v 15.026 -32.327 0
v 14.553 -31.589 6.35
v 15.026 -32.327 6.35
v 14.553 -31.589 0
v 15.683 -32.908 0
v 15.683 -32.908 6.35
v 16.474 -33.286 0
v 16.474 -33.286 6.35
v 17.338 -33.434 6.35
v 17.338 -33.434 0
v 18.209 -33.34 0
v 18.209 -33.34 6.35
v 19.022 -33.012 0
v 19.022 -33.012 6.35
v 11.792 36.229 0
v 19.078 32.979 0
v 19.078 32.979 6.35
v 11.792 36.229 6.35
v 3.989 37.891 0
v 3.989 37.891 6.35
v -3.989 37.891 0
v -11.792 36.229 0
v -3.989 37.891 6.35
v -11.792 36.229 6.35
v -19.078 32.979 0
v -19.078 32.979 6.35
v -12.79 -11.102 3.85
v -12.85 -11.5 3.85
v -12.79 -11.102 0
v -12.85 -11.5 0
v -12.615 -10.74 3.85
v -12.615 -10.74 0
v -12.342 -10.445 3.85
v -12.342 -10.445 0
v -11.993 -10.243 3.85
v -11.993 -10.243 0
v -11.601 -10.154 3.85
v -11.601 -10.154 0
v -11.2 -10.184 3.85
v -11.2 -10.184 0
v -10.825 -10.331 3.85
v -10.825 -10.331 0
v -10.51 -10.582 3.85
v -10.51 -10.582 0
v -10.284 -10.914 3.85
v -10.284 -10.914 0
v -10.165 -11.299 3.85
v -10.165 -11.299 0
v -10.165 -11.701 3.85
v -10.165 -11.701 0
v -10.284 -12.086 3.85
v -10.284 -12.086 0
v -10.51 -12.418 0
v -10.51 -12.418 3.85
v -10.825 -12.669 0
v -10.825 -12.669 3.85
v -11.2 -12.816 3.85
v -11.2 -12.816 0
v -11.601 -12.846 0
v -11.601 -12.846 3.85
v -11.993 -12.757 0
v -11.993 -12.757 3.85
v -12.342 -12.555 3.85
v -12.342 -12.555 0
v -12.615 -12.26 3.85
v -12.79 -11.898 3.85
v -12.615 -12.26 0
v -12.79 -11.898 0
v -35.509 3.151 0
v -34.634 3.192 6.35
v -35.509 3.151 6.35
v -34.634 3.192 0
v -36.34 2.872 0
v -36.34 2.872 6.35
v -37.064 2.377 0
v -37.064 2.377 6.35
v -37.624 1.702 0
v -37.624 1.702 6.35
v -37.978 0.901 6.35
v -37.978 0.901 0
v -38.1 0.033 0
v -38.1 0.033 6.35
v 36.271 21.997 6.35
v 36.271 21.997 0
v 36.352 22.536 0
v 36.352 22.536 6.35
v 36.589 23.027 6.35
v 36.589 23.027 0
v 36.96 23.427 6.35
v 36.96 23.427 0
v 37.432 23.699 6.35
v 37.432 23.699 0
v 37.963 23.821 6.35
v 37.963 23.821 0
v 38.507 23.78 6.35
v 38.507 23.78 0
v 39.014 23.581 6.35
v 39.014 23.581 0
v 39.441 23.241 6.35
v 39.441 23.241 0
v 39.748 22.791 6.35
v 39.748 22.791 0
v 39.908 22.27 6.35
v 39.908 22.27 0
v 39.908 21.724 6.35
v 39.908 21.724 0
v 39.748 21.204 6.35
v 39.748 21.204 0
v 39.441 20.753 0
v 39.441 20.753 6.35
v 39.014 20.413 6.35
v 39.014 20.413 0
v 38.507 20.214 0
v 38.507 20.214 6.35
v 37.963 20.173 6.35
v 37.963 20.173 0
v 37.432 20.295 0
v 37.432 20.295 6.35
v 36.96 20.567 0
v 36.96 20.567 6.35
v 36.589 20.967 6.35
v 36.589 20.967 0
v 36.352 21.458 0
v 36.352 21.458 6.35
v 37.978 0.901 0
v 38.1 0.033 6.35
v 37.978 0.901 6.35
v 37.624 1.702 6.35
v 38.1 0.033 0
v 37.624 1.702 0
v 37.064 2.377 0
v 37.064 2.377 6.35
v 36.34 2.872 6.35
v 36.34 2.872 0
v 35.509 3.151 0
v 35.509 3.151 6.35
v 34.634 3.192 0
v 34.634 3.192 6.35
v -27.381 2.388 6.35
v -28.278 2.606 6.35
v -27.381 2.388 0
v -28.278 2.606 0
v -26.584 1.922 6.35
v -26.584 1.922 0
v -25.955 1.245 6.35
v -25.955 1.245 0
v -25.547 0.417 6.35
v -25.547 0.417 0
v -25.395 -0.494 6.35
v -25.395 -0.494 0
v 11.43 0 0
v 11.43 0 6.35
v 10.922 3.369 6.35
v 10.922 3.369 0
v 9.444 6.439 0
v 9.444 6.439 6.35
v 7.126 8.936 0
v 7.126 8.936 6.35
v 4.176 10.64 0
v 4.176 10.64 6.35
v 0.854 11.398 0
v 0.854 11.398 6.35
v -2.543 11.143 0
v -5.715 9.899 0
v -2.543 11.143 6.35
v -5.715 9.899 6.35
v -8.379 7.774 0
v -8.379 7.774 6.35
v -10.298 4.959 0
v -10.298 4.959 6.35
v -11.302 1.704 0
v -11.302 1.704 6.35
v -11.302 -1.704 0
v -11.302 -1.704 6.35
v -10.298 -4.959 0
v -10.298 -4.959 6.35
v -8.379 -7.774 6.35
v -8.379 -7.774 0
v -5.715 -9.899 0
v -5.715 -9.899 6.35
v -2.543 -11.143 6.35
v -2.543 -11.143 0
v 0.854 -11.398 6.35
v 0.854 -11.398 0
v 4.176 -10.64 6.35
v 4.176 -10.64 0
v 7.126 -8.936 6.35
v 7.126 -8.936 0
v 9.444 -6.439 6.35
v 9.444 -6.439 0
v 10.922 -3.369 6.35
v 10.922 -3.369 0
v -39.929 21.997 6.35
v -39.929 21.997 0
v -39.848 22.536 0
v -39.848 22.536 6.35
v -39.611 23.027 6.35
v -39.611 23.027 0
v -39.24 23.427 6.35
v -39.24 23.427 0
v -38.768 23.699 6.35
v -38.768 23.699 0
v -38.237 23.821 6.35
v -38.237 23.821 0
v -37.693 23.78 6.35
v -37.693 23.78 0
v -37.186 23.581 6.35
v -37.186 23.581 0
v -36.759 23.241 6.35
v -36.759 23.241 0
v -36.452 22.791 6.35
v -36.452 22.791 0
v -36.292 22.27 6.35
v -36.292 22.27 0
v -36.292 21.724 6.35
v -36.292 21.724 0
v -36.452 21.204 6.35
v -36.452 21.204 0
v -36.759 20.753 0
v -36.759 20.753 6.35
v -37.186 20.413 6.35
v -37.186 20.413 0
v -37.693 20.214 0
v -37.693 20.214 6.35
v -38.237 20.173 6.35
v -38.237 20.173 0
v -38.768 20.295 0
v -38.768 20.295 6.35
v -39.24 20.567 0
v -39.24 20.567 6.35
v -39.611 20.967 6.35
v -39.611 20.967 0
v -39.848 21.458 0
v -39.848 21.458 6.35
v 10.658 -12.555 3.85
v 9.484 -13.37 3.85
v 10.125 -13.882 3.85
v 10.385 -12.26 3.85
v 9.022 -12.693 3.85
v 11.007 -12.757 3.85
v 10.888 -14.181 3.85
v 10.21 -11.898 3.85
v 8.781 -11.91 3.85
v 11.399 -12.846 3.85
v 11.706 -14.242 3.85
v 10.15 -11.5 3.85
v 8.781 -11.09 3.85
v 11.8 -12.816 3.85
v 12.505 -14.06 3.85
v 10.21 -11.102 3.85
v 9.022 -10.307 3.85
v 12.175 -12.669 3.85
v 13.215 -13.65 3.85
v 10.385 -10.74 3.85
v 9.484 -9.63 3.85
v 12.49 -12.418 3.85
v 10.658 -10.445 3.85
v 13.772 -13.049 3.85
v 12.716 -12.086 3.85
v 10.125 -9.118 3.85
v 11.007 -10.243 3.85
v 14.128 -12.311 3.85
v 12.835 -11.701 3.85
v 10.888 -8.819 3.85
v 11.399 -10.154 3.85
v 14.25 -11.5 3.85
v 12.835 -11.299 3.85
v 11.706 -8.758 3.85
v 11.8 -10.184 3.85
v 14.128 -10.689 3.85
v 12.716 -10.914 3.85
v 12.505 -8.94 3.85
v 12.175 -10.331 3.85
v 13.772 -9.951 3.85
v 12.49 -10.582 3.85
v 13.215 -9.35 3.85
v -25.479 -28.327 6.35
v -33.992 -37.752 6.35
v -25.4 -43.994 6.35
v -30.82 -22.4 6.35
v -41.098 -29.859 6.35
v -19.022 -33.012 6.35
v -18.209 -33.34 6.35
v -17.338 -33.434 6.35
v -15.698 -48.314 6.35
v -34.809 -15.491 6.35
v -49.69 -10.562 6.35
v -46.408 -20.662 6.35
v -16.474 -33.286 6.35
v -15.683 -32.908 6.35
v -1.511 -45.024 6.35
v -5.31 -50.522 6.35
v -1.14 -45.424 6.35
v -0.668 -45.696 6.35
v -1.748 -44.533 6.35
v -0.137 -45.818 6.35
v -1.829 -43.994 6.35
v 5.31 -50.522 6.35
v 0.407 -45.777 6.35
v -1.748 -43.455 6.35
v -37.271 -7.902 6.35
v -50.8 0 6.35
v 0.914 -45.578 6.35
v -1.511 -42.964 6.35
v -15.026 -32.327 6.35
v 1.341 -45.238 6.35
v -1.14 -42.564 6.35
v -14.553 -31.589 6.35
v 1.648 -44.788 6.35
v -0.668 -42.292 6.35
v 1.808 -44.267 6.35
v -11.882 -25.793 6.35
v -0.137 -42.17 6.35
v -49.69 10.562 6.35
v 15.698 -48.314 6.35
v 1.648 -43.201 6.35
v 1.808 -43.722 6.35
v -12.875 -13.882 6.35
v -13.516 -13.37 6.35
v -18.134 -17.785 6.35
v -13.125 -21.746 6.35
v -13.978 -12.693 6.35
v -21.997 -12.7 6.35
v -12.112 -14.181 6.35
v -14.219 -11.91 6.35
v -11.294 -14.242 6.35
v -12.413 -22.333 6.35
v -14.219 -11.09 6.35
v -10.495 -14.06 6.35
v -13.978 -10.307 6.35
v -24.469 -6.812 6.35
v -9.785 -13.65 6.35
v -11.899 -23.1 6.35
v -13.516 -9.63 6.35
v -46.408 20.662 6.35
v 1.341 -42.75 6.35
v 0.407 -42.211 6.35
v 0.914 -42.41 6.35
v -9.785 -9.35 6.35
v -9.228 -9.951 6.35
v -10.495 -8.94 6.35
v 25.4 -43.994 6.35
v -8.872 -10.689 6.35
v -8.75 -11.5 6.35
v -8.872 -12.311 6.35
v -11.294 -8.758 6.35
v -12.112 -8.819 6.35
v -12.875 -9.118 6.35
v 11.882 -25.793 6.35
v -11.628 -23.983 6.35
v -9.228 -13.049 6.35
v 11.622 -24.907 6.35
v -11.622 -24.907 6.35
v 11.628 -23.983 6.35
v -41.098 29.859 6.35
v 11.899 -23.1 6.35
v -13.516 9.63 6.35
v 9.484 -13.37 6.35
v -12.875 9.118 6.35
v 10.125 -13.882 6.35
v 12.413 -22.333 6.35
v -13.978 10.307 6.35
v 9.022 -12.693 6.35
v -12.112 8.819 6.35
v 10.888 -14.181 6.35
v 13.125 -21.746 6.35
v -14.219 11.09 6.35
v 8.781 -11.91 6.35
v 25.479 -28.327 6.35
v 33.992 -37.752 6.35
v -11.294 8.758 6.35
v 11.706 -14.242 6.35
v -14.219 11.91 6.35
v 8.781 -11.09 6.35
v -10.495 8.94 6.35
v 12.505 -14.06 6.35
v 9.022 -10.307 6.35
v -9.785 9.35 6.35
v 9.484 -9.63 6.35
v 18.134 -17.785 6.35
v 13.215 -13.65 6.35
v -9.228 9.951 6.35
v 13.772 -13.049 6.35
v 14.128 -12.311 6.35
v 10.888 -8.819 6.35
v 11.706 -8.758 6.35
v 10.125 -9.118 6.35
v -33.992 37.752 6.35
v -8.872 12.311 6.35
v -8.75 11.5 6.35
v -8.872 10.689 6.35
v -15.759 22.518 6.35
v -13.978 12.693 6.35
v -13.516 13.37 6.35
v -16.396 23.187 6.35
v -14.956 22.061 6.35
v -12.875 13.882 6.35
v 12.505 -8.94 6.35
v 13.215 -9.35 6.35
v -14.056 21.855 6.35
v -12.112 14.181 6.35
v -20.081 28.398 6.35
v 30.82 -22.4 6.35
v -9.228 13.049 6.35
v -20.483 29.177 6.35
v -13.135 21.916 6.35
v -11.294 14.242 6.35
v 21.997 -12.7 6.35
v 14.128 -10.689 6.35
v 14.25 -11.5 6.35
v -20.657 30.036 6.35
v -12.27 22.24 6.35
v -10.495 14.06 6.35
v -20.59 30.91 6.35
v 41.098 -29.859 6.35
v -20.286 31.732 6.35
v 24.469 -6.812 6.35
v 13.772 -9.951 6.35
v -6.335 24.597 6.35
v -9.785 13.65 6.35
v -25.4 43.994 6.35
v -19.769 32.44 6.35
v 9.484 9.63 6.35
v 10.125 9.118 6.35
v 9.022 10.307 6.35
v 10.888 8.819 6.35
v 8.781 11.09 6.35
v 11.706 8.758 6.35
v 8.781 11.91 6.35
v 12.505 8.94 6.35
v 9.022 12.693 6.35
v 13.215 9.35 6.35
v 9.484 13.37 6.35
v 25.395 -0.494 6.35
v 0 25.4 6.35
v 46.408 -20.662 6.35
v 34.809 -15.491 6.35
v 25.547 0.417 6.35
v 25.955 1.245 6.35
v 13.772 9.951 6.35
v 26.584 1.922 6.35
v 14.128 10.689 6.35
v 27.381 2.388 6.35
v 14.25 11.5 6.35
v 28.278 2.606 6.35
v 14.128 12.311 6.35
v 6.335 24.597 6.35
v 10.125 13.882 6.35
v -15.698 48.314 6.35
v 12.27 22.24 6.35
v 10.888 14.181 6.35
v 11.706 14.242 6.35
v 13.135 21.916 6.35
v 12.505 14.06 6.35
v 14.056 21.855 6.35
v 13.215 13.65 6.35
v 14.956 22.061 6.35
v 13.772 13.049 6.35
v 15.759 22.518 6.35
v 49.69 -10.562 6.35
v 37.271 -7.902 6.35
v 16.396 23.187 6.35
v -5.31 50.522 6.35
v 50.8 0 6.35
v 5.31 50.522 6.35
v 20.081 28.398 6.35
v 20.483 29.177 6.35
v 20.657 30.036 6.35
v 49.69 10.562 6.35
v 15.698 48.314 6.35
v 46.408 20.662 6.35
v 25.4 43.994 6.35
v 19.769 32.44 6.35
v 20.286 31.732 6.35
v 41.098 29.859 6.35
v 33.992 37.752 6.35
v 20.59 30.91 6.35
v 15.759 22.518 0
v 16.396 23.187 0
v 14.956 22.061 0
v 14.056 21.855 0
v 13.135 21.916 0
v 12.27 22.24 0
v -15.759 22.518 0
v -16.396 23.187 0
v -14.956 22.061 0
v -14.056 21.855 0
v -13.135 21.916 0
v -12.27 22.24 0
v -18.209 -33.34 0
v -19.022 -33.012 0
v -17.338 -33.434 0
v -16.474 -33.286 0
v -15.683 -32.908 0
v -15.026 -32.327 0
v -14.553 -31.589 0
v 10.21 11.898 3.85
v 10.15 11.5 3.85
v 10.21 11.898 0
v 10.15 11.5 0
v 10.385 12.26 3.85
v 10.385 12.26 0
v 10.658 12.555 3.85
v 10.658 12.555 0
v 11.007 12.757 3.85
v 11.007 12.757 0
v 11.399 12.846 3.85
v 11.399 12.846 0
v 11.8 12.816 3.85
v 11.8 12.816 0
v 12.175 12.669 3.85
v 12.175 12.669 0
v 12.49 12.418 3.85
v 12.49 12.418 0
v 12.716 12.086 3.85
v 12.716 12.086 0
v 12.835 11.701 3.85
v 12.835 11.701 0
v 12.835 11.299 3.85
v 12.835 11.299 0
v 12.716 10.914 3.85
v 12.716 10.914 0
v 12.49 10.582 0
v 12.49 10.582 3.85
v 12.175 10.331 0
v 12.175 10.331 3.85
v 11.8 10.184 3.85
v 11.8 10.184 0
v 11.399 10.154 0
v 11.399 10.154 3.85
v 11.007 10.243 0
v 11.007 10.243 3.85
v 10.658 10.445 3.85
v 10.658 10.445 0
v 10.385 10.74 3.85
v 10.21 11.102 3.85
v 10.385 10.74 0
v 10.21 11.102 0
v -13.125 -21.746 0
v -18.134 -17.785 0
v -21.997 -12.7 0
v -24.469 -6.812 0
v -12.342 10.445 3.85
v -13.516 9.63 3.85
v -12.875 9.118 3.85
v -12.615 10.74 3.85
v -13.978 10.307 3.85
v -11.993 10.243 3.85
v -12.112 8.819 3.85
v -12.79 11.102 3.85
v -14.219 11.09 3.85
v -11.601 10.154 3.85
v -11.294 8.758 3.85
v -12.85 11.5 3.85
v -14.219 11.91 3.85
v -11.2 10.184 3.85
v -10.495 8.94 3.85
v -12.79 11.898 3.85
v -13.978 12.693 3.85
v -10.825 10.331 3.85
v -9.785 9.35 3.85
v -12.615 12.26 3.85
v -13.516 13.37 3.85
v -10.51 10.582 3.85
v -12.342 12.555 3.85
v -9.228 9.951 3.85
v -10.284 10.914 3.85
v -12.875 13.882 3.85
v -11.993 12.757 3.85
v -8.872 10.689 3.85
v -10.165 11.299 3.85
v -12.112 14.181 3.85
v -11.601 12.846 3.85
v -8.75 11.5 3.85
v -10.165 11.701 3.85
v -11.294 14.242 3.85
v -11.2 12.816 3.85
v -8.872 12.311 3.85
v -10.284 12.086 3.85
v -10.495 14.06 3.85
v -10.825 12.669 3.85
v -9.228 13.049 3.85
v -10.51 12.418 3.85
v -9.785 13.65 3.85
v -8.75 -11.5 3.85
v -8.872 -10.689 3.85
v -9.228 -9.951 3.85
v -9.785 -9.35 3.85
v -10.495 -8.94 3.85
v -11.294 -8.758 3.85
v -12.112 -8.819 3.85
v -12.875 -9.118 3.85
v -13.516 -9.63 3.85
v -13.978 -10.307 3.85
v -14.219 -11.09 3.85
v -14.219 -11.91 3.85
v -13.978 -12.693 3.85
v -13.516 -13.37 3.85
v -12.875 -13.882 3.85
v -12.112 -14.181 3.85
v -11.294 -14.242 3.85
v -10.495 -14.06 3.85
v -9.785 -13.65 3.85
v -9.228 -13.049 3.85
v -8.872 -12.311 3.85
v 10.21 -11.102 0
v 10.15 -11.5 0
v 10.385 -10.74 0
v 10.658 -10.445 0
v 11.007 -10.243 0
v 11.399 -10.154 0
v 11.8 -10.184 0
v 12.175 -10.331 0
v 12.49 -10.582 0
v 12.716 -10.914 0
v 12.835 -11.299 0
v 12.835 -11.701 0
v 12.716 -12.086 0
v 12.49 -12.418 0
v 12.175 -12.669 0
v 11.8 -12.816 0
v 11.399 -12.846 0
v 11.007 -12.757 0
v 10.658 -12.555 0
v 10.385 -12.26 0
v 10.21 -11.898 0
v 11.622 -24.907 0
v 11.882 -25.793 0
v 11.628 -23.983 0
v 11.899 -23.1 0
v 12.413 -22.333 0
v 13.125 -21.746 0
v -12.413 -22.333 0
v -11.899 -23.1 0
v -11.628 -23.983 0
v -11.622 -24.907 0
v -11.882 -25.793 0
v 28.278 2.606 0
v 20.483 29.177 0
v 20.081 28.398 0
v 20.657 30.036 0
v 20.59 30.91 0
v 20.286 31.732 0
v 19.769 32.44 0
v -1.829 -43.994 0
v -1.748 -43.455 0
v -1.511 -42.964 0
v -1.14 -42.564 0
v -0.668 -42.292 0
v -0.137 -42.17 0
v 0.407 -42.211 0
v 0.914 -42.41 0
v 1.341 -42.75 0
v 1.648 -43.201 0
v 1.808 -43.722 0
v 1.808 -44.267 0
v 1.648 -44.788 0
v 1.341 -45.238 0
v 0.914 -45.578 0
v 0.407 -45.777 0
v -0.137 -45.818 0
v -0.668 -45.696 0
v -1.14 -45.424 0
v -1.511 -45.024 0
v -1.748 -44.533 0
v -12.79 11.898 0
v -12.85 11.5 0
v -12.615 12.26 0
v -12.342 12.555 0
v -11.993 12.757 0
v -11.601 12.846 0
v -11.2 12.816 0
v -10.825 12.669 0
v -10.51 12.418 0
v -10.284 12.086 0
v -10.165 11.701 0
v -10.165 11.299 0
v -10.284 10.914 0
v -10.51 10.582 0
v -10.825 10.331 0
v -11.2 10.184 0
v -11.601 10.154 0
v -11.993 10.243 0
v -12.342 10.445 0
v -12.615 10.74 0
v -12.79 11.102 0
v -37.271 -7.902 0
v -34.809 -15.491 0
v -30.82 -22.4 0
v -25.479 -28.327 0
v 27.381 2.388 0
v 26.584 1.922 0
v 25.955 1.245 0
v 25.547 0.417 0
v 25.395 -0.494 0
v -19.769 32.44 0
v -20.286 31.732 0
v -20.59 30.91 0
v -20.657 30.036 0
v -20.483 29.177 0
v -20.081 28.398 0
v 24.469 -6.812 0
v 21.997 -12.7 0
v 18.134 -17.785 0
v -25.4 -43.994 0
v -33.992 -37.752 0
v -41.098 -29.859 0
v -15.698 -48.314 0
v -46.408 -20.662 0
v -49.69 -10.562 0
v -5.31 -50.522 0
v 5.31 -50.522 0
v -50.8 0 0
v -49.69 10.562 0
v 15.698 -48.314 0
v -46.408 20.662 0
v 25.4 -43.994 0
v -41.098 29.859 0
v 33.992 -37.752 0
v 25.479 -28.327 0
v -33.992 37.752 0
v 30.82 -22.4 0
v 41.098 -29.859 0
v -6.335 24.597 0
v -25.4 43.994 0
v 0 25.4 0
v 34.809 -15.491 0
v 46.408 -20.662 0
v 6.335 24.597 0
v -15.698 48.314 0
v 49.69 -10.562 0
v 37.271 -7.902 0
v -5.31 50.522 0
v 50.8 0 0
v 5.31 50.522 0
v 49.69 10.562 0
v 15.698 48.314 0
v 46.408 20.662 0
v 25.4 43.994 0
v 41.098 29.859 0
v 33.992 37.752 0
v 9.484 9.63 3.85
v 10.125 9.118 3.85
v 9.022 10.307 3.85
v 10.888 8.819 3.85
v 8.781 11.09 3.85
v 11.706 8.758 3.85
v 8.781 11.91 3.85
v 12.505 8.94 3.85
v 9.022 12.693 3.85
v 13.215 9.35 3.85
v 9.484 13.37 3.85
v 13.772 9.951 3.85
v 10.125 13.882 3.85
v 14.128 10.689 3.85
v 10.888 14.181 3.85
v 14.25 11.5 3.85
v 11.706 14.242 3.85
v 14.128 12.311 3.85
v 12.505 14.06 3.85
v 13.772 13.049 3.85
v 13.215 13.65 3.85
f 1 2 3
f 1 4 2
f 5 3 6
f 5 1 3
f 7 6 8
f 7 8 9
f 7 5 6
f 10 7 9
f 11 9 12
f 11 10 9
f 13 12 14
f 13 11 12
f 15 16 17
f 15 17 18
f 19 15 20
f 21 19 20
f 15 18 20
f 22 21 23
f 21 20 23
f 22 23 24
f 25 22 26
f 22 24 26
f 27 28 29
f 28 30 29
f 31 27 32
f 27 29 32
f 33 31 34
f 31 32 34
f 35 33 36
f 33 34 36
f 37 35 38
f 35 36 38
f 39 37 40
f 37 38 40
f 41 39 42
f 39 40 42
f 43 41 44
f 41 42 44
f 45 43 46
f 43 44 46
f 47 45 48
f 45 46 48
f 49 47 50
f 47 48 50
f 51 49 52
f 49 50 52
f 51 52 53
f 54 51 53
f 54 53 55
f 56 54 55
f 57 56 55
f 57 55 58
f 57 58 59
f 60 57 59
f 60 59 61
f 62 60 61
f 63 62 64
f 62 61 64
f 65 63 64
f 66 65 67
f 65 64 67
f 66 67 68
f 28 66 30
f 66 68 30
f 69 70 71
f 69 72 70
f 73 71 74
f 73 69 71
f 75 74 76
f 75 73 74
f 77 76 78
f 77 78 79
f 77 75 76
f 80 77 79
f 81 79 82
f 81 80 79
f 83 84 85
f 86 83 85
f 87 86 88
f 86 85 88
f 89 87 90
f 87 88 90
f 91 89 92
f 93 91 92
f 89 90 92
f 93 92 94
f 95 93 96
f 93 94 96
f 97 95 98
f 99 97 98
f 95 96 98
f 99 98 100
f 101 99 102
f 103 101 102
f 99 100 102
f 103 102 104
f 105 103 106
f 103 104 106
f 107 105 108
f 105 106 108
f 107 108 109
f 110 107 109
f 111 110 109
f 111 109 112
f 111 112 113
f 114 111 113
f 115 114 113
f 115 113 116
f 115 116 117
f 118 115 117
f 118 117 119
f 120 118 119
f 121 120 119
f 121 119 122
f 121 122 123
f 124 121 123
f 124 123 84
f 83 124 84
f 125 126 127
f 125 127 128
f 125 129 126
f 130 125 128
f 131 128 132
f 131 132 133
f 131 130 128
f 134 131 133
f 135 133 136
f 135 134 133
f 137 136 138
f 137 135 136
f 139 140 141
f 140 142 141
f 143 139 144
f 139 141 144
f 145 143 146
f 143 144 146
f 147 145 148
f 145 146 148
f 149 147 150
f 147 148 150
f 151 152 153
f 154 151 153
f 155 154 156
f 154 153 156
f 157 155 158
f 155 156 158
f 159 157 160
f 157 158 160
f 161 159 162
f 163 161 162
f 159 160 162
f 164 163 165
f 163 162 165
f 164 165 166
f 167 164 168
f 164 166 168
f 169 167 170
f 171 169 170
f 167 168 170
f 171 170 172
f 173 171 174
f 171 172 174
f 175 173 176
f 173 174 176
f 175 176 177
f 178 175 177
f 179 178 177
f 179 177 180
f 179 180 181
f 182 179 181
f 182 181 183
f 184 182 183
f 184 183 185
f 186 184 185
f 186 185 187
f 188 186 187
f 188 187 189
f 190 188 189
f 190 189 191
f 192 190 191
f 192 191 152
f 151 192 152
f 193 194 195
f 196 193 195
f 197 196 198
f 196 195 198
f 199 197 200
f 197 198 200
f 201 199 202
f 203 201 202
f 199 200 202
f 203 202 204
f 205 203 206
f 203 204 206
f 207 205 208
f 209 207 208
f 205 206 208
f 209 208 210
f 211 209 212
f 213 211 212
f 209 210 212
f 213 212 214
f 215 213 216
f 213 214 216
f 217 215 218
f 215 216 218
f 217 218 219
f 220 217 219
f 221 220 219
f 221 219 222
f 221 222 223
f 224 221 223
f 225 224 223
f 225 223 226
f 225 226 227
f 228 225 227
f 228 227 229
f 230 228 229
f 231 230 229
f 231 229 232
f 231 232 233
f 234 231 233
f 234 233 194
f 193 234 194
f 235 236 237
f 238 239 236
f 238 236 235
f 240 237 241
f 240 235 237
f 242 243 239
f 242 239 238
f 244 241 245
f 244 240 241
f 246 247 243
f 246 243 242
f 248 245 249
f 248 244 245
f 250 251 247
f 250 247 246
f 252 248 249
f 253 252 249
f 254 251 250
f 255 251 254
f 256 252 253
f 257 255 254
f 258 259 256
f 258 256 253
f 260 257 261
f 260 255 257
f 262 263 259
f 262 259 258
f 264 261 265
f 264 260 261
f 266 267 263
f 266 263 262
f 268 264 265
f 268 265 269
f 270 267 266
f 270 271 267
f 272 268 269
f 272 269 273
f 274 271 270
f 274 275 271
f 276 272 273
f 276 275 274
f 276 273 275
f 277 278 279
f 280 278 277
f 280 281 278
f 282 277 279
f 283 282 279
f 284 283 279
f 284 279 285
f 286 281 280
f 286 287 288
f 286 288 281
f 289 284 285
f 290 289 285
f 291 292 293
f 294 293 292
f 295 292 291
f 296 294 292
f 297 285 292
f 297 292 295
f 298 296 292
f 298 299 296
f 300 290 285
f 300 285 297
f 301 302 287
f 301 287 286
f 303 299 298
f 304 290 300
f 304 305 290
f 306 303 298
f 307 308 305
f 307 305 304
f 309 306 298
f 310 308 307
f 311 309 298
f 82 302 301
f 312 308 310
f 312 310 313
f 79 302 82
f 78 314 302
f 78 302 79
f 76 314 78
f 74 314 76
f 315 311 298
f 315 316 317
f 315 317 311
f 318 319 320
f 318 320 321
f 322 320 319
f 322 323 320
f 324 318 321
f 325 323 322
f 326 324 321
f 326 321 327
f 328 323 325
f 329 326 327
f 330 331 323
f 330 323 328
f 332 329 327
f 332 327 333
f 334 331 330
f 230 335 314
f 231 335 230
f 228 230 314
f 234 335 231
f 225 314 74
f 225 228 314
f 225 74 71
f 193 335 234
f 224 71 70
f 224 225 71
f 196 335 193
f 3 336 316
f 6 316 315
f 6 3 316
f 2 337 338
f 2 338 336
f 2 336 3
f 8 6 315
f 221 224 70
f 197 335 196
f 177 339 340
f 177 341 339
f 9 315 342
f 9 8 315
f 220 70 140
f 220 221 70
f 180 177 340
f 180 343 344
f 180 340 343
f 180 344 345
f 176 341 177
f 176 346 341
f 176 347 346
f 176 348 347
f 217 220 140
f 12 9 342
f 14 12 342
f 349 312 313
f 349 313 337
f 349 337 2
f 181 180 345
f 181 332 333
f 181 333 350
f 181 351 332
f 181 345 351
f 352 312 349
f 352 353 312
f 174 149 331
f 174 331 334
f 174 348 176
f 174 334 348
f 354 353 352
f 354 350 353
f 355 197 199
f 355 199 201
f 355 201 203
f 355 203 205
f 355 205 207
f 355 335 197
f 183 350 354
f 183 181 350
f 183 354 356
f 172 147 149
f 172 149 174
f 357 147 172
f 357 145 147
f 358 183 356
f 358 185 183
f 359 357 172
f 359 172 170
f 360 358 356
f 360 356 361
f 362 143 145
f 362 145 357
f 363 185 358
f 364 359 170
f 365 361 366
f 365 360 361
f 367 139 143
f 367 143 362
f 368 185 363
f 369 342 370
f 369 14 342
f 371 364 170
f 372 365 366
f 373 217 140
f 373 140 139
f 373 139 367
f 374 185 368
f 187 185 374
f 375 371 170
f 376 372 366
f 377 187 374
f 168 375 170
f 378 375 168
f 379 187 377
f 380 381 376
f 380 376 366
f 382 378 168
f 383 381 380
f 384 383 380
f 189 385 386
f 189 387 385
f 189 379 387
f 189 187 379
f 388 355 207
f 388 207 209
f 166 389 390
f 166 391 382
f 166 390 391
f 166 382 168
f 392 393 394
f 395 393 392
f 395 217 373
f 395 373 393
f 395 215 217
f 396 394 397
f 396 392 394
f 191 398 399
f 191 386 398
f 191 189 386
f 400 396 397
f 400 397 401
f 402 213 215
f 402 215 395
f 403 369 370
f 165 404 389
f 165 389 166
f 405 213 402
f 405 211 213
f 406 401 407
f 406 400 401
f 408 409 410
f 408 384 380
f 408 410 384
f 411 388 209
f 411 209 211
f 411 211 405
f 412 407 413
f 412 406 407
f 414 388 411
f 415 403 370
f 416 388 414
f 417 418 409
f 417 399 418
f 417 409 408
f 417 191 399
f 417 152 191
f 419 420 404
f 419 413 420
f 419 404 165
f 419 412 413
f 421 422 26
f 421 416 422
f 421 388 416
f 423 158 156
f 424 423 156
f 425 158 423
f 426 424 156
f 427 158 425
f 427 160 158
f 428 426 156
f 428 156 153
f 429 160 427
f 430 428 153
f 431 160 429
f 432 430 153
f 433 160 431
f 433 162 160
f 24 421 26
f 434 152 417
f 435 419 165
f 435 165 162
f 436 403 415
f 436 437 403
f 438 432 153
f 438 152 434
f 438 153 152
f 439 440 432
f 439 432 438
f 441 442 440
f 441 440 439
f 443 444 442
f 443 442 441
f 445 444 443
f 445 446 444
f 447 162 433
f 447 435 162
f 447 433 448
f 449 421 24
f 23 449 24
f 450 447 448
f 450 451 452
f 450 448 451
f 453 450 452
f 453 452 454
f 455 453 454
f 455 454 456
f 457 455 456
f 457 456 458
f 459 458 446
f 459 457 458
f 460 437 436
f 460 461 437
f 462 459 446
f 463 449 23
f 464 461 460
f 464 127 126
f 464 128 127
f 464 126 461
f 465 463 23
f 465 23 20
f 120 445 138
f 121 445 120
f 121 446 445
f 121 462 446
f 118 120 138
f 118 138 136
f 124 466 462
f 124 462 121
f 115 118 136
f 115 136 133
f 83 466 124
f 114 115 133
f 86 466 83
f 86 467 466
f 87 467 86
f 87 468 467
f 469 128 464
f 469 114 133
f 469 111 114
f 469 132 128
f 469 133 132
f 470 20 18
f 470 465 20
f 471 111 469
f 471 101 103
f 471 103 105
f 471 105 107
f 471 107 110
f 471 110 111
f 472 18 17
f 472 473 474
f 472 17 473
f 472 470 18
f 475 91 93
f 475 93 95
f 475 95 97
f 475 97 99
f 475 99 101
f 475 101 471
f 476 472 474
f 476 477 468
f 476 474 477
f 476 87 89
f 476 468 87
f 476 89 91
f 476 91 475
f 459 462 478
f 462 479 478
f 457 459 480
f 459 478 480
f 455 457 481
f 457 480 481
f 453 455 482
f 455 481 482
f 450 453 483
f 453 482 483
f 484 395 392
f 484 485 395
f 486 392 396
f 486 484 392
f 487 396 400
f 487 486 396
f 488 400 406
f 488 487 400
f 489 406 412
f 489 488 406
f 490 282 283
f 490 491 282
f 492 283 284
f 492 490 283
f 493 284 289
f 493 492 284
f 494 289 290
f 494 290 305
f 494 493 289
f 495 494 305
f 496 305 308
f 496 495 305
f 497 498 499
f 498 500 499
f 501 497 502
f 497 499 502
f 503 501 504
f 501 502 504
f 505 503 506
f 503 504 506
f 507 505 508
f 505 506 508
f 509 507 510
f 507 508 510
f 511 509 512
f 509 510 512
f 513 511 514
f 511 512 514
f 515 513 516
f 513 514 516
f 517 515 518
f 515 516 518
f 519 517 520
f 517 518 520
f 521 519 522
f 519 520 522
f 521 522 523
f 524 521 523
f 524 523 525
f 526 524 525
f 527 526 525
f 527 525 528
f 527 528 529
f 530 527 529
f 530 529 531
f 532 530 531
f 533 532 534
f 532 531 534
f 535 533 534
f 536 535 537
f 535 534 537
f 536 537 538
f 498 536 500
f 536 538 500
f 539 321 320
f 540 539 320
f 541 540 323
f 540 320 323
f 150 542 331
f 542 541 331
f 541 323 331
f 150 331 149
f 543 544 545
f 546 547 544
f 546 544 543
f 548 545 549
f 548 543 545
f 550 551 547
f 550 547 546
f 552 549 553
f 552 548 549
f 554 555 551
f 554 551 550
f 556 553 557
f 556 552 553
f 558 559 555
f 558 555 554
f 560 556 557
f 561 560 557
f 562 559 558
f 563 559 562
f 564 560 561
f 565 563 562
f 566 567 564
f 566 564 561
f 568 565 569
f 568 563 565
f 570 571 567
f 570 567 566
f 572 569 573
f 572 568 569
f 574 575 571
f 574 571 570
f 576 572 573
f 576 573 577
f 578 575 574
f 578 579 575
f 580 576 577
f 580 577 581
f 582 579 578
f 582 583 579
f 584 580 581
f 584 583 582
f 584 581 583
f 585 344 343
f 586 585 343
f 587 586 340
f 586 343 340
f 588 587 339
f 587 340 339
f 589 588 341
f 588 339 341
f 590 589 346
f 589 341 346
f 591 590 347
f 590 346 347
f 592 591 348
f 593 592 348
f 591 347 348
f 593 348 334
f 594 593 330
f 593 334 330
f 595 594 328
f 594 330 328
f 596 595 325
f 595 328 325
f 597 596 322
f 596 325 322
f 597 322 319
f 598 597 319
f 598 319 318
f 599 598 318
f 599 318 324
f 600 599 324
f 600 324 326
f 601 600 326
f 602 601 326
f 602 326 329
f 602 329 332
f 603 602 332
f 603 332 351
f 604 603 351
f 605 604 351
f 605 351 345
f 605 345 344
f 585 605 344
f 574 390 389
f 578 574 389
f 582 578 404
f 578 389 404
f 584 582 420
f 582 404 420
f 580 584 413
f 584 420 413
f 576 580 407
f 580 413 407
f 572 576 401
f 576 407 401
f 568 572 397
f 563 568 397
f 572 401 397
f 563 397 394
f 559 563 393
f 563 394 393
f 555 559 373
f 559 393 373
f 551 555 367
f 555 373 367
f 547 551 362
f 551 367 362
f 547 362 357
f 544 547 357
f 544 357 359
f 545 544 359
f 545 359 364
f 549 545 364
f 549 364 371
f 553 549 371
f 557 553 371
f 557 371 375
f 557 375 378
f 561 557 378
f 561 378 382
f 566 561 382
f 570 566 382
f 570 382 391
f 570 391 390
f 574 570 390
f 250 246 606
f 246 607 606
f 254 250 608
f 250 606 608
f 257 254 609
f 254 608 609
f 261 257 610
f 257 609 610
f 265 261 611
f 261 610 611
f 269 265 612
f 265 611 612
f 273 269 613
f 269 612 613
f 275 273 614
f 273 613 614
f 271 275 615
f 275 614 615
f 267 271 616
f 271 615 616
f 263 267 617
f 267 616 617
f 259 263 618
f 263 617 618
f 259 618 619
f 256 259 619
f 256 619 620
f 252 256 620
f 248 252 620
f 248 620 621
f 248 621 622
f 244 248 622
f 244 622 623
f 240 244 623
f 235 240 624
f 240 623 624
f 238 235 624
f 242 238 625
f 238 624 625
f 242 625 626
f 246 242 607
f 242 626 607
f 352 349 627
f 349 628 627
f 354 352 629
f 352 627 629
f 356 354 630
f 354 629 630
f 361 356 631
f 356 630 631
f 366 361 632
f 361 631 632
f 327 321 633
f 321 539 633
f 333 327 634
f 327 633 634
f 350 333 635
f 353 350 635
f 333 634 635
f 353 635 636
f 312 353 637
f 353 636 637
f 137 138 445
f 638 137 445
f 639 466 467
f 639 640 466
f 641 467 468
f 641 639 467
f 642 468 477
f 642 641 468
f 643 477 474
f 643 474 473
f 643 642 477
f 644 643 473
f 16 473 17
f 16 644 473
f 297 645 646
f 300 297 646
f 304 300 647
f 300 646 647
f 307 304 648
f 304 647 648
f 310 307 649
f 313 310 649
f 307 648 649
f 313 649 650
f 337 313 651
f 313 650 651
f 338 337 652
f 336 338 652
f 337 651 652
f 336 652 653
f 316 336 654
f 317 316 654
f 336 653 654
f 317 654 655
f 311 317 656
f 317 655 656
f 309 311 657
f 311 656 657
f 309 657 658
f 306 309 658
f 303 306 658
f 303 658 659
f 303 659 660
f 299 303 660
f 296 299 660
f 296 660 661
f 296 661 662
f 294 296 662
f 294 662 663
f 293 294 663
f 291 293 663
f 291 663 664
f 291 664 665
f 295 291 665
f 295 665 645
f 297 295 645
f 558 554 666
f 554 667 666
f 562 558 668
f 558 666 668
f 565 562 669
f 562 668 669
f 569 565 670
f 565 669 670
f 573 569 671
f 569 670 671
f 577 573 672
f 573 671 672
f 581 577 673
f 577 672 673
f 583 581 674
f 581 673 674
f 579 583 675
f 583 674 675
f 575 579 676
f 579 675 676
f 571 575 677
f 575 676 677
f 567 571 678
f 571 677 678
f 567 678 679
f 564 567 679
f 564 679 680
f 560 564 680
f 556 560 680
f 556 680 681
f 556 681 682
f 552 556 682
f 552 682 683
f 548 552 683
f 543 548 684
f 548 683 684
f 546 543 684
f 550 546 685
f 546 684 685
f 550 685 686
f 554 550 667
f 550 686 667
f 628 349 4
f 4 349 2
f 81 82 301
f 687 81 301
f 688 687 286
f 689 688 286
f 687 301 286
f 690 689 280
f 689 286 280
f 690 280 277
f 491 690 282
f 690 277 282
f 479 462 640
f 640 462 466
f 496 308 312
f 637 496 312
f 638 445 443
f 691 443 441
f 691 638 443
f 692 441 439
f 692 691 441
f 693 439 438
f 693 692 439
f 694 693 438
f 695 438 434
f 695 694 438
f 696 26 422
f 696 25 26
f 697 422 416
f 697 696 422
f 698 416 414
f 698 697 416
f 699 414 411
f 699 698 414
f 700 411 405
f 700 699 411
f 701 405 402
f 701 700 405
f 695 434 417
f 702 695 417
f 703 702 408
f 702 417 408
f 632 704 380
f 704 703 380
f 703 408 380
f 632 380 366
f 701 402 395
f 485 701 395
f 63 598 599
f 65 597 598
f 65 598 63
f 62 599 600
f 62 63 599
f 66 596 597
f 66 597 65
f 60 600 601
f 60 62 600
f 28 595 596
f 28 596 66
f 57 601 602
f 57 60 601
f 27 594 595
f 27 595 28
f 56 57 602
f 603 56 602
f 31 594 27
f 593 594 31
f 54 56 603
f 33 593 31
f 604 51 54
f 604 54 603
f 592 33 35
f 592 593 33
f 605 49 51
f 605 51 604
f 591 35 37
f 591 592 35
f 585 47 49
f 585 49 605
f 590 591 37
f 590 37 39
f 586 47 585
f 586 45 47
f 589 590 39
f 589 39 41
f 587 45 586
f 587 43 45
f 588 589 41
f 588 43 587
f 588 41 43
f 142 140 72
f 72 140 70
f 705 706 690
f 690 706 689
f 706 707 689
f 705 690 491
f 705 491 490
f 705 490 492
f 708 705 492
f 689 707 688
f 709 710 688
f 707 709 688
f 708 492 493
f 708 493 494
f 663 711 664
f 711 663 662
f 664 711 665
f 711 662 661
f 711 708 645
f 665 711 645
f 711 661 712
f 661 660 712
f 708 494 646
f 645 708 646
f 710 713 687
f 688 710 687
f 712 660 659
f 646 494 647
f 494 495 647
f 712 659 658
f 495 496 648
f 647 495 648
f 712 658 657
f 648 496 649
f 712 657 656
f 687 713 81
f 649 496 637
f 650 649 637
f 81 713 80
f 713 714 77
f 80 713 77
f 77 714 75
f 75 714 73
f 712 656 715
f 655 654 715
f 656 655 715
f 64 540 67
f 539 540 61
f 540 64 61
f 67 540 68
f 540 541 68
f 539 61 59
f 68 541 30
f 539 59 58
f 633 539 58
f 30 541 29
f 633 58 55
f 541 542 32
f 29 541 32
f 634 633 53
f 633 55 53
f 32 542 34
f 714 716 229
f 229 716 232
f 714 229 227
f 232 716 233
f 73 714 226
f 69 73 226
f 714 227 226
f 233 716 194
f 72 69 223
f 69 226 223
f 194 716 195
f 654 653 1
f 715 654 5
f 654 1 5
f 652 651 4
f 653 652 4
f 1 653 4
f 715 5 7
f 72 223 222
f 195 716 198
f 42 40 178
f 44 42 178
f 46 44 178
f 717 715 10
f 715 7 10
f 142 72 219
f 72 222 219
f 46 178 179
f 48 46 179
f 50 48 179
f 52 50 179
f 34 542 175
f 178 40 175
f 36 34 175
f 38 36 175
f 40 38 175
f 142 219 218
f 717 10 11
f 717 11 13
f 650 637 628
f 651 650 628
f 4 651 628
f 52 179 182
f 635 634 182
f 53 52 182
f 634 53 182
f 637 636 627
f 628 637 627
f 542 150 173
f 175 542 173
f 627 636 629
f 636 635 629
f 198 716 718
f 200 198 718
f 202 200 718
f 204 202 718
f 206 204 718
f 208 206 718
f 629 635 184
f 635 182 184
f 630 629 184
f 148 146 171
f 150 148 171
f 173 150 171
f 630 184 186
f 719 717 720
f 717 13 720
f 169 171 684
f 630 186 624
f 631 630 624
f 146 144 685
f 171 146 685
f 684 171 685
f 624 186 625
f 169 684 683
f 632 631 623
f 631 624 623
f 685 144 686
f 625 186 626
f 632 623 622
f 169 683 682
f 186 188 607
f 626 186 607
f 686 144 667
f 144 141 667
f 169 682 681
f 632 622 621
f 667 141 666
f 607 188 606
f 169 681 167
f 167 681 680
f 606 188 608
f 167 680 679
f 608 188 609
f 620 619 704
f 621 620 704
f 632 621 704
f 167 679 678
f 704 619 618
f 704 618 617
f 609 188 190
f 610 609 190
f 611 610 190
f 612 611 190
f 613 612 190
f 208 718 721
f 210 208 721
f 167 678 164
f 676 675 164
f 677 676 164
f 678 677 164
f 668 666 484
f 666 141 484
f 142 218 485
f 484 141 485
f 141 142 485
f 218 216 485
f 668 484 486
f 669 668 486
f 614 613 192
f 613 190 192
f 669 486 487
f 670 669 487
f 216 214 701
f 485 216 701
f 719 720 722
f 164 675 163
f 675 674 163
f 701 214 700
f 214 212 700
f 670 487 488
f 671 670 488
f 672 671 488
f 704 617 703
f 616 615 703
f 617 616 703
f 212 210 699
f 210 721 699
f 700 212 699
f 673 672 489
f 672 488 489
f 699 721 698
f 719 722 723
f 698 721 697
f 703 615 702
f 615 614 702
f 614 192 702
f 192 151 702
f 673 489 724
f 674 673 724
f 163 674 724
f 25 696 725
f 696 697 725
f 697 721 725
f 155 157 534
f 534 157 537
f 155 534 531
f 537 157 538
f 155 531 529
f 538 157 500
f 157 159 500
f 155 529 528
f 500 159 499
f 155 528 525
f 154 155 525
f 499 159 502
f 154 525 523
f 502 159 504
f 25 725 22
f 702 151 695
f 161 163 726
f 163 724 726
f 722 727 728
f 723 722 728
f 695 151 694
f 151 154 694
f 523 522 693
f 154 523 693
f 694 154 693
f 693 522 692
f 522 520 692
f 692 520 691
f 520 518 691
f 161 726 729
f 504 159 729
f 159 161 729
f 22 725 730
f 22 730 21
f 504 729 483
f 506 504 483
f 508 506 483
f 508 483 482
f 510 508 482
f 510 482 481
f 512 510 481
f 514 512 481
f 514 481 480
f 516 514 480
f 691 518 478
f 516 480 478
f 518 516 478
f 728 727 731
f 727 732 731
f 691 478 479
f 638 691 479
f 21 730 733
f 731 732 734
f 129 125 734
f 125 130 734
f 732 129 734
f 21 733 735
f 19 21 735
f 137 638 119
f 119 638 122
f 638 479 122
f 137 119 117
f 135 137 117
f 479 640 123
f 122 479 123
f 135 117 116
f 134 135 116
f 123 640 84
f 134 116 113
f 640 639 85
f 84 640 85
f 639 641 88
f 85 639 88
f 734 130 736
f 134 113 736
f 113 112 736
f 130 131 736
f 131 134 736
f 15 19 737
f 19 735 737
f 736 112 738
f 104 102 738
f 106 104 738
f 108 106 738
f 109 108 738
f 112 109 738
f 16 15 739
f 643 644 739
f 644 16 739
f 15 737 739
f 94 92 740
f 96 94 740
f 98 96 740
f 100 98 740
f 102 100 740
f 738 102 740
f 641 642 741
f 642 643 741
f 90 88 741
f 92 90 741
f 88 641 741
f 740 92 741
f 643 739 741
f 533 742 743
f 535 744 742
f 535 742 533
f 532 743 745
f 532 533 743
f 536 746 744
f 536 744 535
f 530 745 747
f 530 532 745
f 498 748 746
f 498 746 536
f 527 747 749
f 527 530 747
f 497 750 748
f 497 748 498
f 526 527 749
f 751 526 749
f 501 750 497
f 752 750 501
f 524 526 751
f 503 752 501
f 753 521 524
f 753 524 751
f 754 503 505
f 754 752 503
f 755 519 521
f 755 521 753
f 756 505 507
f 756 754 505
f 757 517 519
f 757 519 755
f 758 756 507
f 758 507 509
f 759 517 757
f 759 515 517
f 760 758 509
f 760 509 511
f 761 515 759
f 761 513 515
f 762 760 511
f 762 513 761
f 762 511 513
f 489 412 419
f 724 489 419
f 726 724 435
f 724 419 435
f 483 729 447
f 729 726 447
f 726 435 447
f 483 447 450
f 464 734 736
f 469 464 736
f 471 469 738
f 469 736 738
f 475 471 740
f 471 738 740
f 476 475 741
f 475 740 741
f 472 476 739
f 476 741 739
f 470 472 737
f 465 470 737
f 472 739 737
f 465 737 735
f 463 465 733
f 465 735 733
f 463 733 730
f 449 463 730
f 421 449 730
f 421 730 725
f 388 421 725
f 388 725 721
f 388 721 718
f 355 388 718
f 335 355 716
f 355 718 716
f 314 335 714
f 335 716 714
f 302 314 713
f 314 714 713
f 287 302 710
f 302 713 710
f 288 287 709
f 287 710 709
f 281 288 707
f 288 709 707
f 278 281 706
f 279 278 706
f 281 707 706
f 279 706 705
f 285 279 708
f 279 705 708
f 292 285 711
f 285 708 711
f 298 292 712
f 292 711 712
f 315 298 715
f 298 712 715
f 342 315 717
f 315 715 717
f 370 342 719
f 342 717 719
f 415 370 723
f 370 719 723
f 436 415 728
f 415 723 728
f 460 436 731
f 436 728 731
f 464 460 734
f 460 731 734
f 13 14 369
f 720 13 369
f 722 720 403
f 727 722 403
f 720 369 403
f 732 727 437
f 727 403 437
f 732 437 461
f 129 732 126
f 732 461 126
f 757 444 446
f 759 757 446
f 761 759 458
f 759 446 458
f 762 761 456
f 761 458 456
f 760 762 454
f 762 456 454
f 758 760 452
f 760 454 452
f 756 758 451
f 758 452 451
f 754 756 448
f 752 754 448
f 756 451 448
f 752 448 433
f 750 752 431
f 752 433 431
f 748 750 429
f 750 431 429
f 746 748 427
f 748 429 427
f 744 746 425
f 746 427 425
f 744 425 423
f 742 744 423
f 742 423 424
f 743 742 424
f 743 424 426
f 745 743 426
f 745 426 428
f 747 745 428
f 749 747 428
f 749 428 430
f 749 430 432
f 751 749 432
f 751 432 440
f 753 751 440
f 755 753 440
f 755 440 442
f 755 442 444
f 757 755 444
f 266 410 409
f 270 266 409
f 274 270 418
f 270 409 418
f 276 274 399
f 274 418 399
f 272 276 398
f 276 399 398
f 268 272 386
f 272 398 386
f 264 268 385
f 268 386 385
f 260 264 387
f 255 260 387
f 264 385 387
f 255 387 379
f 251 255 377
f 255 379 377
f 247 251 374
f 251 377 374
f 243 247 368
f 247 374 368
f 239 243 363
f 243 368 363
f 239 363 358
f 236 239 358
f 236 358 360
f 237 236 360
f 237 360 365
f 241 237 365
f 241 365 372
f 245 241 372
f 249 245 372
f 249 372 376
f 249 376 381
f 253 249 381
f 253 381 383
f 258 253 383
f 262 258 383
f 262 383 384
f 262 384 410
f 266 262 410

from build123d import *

# Parameters (mm, degrees)
SKETCH1_R                        = 50.8
BOSS_EXTRUDE1_DEPTH              = 6.35
SKETCH2_R                        = 11.43
CUT_EXTRUDE1_DEPTH               = 7.35
CBORE_FOR_M2_5_SHCS1_D           = 2.7
CBORE_FOR_M2_5_SHCS1_DEPTH       = 10.16
CBORE_FOR_M2_5_SHCS1_CBORE_D     = 5.5
CBORE_FOR_M2_5_SHCS1_CBORE_DEPTH = 2.5
CBORE_FOR_M2_5_SHCS1_TIP         = 0.811161836
F_6_CLEARANCE_HOLE1_D            = 3.6576
F_6_CLEARANCE_HOLE1_DEPTH        = 10.16
F_6_CLEARANCE_HOLE1_TIP          = 1.0988539
CUT_EXTRUDE2_DEPTH               = 7.35
FILLET2_R                        = 3.175
CIRPATTERN1_COUNT                = 3
FILLET2_OF_CIRPATTERN1_R         = 3.175


with BuildPart() as part:
    # Sketch1 → Boss-Extrude1 (new body)
    with BuildSketch(Plane.XY):
        Circle(SKETCH1_R)
    extrude(amount=BOSS_EXTRUDE1_DEPTH)

    # Sketch2 → Cut-Extrude1 (cut, through all)
    with BuildSketch(Plane.XY.offset(6.35)):
        Circle(SKETCH2_R)
    extrude(amount=-CUT_EXTRUDE1_DEPTH, mode=Mode.SUBTRACT)

    # CBORE for M2.5 SHCS1
    with Locations(Plane.XY.offset(6.35)):
        with Locations((0, 0), (11.5, 11.5), (-11.5, -11.5), (-11.5, 11.5), (11.5, -11.5)):
            CounterBoreHole(CBORE_FOR_M2_5_SHCS1_D / 2, CBORE_FOR_M2_5_SHCS1_CBORE_D / 2, CBORE_FOR_M2_5_SHCS1_CBORE_DEPTH, depth=CBORE_FOR_M2_5_SHCS1_DEPTH)
            with Locations((0, 0, -(CBORE_FOR_M2_5_SHCS1_DEPTH + CBORE_FOR_M2_5_SHCS1_TIP / 2))):  # 118° drill point
                Cone(0, CBORE_FOR_M2_5_SHCS1_D / 2, CBORE_FOR_M2_5_SHCS1_TIP, mode=Mode.SUBTRACT)

    # #6 Clearance Hole1
    with Locations(Plane.XY.offset(6.35)):
        with Locations((-38.1, 21.997045256), (0, -43.994090512), (38.1, 21.997045256)):
            Hole(F_6_CLEARANCE_HOLE1_D / 2, depth=F_6_CLEARANCE_HOLE1_DEPTH)
            with Locations((0, 0, -(F_6_CLEARANCE_HOLE1_DEPTH + F_6_CLEARANCE_HOLE1_TIP / 2))):  # 118° drill point
                Cone(0, F_6_CLEARANCE_HOLE1_D / 2, F_6_CLEARANCE_HOLE1_TIP, mode=Mode.SUBTRACT)

    # Sketch10 → Cut-Extrude2 (cut, through all)
    with BuildSketch(Plane.XY.offset(6.35)):
        with BuildLine():
            Line((14.664933069, 20.738846113), (21.997399604, 31.108269169))
            ThreePointArc((21.997399604, 31.108269169), (0, 38.1), (-21.997399604, 31.108269169))
            Line((-21.997399604, 31.108269169), (-14.664933069, 20.738846113))
            ThreePointArc((-14.664933069, 20.738846113), (0, 25.4), (14.664933069, 20.738846113))
        make_face()
    cut_extrude2 = extrude(amount=-CUT_EXTRUDE2_DEPTH, mode=Mode.SUBTRACT)

    # Fillet2
    fillet2_edges = [part.edges().sort_by_distance(p)[0] for p in [
        (-21.997399604, 31.108269169, 3.175),
        (21.997399604, 31.108269169, 3.175),
        (14.664933069, 20.738846113, 3.175),
        (-14.664933069, 20.738846113, 3.175),
    ]]
    fillet(fillet2_edges, radius=FILLET2_R)

    # CirPattern1: Cut-Extrude2 ×3 about axis
    cirpattern1_axis = Axis((0, 0, 0), (0, 0, 1))
    for i in range(1, CIRPATTERN1_COUNT):
        add(cut_extrude2.rotate(cirpattern1_axis, i * 360 / CIRPATTERN1_COUNT), mode=Mode.SUBTRACT)

    # Fillet2 of CirPattern1
    fillet2_of_cirpattern1_edges = [part.edges().sort_by_distance(p)[0] for p in [
        (-15.941851566, -34.604441458, 3.175),
        (-37.93925117, 3.49617229, 3.175),
        (-25.292834113, 2.330781526, 3.175),
        (-10.627901044, -23.069627639, 3.175),
        (37.93925117, 3.49617229, 3.175),
        (15.941851566, -34.604441458, 3.175),
        (10.627901044, -23.069627639, 3.175),
        (25.292834113, 2.330781526, 3.175),
    ]]
    fillet(fillet2_of_cirpattern1_edges, radius=FILLET2_OF_CIRPATTERN1_R)


solid = part.part
